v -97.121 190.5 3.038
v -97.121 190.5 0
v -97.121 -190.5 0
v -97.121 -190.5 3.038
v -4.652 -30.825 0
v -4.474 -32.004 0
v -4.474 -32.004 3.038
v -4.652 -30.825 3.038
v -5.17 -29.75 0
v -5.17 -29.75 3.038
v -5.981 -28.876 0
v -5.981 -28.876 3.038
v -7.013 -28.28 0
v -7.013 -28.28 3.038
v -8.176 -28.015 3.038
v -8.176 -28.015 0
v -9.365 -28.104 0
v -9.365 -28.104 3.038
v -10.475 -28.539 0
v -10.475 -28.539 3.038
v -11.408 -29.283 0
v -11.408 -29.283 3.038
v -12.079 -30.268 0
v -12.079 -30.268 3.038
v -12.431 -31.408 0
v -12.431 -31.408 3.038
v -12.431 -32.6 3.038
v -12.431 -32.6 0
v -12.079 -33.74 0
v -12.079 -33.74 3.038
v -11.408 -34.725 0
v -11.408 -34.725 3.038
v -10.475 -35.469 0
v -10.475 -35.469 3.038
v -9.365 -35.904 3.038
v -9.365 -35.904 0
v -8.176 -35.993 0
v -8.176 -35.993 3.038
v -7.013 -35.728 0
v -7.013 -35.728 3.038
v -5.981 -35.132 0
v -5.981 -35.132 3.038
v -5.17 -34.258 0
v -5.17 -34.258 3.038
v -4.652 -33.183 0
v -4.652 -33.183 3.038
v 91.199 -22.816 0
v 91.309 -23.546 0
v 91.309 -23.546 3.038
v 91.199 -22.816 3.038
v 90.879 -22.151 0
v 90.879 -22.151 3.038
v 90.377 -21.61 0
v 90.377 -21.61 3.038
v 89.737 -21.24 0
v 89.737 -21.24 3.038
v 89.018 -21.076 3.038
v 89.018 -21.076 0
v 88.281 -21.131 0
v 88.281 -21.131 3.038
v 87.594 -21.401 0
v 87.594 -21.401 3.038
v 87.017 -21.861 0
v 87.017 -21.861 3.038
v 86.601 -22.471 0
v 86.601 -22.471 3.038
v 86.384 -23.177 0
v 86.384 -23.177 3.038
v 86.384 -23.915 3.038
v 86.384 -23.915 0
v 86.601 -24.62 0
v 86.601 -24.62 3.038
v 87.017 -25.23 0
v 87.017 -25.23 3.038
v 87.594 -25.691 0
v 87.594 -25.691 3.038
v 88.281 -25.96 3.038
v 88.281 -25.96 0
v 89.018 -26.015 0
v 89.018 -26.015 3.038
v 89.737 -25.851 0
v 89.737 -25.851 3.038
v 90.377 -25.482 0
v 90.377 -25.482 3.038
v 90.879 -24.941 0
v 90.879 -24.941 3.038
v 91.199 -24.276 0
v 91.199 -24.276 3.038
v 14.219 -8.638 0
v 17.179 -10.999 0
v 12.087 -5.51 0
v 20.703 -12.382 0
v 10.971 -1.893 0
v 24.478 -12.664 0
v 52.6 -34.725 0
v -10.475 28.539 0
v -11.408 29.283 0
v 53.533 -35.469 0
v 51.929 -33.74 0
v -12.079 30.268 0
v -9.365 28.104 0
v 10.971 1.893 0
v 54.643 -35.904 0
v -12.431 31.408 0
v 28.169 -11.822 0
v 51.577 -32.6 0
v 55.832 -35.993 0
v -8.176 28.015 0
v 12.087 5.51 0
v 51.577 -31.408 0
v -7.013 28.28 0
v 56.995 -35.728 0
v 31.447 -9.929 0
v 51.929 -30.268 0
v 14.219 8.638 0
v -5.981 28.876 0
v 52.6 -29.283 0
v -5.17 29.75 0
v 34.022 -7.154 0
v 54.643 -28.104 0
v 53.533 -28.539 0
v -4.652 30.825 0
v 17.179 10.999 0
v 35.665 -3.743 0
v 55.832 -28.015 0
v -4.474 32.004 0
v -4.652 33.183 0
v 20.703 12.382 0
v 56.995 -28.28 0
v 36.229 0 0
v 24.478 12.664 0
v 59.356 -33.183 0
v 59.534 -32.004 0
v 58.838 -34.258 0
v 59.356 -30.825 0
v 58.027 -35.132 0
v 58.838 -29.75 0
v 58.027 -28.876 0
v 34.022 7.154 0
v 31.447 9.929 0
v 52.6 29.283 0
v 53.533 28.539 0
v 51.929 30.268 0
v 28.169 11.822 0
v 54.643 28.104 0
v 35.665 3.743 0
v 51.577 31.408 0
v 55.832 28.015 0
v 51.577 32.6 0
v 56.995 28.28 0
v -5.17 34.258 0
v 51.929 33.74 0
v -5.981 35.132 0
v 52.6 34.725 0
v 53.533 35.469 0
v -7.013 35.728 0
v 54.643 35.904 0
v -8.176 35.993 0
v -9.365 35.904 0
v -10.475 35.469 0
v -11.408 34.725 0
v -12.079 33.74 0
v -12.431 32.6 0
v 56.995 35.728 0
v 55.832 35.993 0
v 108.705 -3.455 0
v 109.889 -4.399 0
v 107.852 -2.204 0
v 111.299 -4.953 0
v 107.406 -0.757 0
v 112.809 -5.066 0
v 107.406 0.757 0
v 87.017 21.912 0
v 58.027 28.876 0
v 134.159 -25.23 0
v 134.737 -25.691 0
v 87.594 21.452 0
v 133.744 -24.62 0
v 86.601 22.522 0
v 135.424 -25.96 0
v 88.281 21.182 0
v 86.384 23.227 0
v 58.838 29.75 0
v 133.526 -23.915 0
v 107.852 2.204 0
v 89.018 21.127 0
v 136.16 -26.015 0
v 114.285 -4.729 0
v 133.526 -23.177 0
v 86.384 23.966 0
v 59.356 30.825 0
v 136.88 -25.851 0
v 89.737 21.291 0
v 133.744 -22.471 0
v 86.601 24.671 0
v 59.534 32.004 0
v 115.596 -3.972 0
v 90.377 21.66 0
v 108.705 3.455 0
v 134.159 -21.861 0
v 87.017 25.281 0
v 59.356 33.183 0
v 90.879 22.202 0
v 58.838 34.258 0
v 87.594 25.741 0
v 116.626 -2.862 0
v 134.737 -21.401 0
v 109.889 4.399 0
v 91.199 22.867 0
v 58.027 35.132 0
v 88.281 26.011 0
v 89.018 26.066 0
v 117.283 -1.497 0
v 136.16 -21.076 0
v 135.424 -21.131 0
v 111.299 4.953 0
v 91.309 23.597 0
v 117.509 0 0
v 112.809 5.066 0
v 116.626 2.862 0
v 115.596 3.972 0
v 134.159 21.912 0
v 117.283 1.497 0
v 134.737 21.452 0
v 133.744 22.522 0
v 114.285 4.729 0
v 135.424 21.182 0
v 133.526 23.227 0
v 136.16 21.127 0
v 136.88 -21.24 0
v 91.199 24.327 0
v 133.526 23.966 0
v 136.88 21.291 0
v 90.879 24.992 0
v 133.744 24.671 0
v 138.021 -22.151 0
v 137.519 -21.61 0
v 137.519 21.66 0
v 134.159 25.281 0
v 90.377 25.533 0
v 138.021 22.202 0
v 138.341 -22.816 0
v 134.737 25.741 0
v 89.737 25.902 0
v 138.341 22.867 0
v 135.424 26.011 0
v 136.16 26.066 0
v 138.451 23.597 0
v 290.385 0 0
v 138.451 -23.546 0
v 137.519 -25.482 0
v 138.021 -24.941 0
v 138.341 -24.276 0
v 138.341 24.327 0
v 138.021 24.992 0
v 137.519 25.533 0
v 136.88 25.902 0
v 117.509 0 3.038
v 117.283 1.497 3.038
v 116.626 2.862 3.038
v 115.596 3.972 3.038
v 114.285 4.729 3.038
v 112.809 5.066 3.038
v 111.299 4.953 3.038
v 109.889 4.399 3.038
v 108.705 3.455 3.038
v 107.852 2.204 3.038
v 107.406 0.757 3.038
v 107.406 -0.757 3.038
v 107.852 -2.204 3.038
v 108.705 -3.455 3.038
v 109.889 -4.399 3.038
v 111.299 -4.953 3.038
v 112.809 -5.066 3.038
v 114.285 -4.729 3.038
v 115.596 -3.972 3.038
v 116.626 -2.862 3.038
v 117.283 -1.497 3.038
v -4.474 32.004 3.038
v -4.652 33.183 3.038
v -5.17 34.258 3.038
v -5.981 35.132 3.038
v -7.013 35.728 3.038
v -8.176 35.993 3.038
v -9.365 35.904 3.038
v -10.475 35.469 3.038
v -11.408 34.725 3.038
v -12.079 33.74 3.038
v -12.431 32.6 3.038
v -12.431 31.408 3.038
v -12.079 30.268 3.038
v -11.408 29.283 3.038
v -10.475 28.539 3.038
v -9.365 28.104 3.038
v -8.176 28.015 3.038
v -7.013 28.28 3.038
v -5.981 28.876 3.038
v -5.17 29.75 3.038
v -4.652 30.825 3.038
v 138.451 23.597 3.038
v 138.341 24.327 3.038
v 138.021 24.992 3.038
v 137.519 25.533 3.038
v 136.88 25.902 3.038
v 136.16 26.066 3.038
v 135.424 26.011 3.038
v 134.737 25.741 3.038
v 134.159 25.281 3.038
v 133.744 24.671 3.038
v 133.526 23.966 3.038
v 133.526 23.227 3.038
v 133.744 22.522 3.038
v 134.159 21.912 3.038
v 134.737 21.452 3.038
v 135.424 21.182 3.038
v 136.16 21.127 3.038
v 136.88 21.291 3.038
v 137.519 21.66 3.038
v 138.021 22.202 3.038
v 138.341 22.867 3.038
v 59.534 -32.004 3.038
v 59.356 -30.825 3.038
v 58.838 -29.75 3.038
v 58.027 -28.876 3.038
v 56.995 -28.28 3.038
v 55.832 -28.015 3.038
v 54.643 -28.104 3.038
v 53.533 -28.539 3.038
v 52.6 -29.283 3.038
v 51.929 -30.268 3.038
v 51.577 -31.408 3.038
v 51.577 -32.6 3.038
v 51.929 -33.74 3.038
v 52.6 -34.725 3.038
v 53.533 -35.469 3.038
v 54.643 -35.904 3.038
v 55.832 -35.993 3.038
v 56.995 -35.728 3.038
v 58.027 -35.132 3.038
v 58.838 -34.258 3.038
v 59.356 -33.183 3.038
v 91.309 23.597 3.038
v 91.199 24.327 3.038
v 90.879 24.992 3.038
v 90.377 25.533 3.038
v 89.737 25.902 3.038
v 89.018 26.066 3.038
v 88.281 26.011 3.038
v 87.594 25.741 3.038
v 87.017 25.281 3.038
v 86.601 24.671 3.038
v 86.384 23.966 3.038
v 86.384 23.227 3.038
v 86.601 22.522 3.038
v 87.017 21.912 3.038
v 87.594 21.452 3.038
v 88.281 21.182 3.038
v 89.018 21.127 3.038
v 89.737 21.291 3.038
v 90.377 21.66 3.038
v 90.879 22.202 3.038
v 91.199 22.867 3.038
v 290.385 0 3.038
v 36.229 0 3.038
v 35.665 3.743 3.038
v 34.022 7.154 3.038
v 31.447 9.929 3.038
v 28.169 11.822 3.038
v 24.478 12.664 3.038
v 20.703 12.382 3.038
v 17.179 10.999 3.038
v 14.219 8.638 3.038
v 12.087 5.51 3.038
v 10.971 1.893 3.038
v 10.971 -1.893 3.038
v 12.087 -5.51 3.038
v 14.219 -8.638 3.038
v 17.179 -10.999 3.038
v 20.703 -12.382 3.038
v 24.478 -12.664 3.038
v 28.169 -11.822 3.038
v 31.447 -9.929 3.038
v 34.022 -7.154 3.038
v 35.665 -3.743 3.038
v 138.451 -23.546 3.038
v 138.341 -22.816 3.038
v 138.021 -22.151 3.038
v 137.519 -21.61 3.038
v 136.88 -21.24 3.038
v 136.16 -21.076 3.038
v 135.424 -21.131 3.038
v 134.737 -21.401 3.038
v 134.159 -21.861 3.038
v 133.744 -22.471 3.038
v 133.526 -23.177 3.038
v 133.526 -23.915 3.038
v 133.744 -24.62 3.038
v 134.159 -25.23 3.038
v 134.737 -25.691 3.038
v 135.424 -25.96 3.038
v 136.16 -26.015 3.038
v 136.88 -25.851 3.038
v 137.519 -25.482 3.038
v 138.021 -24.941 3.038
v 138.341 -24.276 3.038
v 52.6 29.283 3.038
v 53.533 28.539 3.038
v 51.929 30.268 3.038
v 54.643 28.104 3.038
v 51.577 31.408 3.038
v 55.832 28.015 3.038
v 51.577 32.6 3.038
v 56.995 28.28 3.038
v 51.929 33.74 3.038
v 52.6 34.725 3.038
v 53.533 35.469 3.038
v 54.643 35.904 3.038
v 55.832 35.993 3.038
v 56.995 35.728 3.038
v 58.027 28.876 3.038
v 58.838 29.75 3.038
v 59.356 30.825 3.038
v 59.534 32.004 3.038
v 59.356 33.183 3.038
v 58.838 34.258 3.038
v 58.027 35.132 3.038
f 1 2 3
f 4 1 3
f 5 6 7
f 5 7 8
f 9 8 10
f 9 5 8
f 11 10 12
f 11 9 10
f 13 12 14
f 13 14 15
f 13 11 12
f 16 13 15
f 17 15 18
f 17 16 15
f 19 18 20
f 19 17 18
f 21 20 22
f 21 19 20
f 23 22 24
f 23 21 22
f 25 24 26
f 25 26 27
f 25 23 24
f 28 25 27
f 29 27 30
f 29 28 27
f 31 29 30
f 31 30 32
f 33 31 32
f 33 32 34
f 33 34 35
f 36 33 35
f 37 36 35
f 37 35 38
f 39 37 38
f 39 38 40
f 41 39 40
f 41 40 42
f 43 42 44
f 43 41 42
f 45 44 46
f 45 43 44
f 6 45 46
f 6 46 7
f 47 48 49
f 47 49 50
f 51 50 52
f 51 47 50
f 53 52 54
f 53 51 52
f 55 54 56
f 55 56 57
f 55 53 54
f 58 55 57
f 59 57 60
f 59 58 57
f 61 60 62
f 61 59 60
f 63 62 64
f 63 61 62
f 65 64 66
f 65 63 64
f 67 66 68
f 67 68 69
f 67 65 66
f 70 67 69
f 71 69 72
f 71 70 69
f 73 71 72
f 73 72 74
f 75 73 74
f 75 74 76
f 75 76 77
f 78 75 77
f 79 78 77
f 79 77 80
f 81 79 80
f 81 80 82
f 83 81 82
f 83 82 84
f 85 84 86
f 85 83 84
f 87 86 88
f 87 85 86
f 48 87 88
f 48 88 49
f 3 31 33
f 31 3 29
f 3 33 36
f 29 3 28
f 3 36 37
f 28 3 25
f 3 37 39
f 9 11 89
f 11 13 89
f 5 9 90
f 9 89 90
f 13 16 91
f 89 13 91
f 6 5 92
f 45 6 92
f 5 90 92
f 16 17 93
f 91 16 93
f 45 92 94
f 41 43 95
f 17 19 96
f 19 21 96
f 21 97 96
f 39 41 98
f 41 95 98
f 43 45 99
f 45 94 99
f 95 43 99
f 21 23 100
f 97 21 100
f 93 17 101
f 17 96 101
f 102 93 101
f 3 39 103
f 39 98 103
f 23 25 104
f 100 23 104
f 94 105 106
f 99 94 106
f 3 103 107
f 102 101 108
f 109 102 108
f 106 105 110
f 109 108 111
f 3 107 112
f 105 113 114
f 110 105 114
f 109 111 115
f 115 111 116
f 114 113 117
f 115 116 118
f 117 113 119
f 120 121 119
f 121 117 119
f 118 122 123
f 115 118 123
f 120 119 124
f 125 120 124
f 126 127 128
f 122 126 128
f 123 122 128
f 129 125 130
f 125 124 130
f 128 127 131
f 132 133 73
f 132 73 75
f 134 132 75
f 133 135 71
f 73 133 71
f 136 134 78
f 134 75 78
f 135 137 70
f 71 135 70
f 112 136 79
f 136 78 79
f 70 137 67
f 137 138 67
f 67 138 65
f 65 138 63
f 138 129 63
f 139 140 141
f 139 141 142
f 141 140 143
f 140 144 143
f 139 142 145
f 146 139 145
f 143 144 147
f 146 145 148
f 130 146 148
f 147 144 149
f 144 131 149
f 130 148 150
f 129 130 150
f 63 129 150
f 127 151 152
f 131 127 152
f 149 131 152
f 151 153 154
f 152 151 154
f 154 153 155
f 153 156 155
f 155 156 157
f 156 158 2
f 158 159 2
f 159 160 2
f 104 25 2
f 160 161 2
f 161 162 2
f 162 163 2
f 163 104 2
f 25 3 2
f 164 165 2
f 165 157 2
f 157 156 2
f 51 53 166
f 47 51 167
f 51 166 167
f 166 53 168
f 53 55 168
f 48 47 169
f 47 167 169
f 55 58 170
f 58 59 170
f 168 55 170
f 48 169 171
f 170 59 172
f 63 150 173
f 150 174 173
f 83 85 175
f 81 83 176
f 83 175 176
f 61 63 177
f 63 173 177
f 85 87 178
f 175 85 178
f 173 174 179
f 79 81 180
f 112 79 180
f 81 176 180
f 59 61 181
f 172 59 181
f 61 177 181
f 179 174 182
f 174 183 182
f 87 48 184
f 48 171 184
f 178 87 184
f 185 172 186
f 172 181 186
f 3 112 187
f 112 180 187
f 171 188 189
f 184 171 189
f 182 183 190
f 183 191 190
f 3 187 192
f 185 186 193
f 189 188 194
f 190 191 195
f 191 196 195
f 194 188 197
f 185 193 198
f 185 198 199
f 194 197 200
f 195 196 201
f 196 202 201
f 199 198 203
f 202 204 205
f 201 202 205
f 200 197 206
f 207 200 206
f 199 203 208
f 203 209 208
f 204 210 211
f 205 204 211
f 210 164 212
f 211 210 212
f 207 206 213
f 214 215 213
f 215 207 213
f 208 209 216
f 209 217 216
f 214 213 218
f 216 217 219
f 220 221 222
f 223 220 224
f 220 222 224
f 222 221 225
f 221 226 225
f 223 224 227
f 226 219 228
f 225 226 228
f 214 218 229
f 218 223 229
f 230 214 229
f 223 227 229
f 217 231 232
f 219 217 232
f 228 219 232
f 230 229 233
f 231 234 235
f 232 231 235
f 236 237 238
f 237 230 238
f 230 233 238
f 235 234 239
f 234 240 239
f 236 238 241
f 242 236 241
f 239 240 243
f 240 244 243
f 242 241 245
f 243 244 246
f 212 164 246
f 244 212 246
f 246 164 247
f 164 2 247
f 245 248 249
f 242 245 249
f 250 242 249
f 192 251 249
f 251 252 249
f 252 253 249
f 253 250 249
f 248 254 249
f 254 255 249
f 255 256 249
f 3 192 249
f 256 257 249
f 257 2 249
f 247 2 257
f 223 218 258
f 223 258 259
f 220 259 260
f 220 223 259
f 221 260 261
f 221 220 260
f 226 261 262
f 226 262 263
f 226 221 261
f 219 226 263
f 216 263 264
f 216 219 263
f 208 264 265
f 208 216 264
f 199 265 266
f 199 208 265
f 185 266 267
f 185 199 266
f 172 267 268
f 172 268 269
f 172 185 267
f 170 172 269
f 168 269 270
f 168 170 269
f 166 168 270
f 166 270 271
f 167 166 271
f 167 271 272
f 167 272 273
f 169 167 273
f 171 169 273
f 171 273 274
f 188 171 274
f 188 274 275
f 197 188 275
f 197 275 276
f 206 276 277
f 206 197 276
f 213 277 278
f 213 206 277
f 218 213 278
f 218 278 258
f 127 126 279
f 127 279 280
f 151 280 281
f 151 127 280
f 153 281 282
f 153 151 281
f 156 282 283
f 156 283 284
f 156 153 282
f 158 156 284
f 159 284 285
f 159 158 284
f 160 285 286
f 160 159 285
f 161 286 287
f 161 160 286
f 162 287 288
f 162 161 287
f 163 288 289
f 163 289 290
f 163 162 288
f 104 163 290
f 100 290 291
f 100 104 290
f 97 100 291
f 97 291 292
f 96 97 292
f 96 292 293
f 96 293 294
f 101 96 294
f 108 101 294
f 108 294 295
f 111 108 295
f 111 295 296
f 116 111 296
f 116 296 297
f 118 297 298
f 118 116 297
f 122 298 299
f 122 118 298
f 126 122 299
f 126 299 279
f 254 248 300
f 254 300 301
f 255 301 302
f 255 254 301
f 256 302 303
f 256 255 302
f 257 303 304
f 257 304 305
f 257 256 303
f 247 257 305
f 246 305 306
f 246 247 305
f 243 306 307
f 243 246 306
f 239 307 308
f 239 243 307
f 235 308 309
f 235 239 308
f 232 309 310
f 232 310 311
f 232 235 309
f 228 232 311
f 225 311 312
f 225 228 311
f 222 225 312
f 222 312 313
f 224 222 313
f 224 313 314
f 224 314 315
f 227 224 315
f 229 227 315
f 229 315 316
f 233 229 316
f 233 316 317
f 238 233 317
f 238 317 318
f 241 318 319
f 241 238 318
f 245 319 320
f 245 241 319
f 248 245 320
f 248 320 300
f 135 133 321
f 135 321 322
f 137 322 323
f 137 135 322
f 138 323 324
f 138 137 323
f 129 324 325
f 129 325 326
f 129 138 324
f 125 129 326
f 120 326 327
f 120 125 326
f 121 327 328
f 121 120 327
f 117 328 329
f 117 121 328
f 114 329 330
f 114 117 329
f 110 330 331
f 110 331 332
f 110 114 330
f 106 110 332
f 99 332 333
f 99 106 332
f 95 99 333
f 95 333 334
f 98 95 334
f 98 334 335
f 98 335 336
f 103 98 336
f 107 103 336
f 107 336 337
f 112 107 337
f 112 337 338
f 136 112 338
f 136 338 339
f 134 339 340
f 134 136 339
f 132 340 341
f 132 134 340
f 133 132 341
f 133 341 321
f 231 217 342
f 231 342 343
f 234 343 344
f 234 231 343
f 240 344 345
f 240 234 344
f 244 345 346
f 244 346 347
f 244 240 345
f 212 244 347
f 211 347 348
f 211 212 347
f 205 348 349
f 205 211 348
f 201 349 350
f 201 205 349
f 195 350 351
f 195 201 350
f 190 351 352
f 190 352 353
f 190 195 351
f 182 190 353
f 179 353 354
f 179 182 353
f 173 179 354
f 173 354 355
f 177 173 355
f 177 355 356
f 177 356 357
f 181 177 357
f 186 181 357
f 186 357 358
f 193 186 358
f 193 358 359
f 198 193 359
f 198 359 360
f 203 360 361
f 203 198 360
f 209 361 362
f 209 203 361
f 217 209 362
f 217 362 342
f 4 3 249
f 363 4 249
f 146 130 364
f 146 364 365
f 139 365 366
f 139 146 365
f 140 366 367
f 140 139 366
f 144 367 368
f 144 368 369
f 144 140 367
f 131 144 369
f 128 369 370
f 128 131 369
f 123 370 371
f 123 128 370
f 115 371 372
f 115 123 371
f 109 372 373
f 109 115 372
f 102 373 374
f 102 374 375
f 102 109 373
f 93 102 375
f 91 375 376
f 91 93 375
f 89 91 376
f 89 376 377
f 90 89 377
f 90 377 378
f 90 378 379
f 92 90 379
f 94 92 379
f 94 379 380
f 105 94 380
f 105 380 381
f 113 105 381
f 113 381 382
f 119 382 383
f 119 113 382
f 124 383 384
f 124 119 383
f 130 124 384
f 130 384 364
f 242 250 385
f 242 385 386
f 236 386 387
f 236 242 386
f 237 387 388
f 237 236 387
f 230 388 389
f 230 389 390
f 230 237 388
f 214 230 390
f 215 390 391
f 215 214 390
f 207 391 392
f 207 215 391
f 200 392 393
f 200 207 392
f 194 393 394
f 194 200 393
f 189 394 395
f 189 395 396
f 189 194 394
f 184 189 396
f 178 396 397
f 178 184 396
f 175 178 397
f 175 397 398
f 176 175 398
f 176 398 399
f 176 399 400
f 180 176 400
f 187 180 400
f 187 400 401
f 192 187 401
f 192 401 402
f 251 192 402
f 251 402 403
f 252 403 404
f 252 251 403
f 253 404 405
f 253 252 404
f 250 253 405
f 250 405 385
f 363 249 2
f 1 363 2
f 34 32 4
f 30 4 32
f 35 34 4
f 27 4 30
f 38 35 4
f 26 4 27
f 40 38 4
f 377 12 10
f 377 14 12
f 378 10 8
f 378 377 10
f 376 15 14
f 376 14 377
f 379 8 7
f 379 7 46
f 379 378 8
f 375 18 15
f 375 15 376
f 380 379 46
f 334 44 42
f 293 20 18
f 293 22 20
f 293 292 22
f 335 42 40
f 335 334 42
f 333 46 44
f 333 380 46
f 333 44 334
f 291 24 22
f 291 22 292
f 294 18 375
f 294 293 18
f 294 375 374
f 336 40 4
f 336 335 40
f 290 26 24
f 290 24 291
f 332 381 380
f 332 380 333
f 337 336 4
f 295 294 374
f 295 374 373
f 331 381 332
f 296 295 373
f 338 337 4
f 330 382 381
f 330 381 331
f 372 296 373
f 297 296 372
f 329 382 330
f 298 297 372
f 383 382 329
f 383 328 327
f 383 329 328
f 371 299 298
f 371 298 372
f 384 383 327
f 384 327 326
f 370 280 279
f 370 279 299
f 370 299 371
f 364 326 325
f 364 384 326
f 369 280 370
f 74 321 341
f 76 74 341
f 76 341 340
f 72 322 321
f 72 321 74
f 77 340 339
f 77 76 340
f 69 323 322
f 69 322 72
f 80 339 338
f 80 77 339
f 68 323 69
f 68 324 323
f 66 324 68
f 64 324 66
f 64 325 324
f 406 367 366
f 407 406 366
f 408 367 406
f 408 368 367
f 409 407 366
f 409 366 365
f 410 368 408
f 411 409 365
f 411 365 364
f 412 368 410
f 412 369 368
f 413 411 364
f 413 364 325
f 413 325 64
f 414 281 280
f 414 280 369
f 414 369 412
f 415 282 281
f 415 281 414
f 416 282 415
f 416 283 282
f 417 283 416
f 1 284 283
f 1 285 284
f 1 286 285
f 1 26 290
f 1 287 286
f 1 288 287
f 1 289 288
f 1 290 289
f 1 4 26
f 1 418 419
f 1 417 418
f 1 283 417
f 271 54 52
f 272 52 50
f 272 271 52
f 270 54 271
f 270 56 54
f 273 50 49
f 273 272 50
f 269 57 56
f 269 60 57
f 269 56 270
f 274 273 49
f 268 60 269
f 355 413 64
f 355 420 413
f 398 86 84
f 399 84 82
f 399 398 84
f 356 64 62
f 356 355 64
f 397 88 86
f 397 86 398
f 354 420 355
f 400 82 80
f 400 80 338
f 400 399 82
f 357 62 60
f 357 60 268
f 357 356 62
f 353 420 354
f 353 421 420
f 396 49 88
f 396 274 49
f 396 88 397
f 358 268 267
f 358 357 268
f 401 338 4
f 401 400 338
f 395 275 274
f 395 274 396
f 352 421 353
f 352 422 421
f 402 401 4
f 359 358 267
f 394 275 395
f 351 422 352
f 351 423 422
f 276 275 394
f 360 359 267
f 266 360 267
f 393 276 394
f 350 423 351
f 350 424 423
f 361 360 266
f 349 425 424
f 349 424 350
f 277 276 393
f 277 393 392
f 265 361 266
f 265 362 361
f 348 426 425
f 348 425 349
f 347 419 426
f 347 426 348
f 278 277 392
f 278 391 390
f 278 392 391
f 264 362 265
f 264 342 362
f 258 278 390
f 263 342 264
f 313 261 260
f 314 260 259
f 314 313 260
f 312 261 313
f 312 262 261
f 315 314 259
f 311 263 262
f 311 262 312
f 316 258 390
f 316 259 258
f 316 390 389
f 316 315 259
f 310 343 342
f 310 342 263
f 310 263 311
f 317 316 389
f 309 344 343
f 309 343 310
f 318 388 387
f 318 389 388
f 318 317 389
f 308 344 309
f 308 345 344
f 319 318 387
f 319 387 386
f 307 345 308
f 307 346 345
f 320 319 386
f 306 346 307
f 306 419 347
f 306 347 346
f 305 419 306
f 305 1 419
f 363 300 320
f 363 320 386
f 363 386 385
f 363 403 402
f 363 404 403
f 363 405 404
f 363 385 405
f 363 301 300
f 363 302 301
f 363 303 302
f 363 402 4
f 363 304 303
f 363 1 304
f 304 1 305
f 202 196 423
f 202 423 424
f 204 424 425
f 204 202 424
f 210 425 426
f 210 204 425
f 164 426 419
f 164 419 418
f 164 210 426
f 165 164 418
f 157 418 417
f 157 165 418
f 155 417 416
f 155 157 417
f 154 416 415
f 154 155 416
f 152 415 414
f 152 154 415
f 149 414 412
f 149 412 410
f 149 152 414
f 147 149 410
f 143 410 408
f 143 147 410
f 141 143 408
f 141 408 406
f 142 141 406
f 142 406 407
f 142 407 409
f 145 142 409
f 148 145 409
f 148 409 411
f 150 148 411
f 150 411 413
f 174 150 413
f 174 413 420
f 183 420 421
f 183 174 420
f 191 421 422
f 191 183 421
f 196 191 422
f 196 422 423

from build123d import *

# Parameters (mm, degrees)
F0_R     = 4.0005
F0_R_2   = 2.4765
F0_R_3   = 12.7
F0_R_4   = 5.08
F1_DEPTH = 3.03784


with BuildPart() as f1:
    # F0 (on Top) → F1 (new body)
    with BuildSketch(Plane.XY):
        Polygon((-97.120928, -190.5), (290.385188, 0), (-97.120928, 190.5), align=None)
        with Locations((-8.474928, -32.004)):
            Circle(F0_R, mode=Mode.SUBTRACT)
        with Locations((55.533072, -32.004)):
            Circle(F0_R, mode=Mode.SUBTRACT)
        with Locations((88.832472, -23.5458)):
            Circle(F0_R_2, mode=Mode.SUBTRACT)
        with Locations((135.974872, -23.5458)):
            Circle(F0_R_2, mode=Mode.SUBTRACT)
        with Locations((-8.474928, 32.004)):
            Circle(F0_R, mode=Mode.SUBTRACT)
        with Locations((23.529072, 0)):
            Circle(F0_R_3, mode=Mode.SUBTRACT)
        with Locations((88.832472, 23.5966)):
            Circle(F0_R_2, mode=Mode.SUBTRACT)
        with Locations((55.533072, 32.004)):
            Circle(F0_R, mode=Mode.SUBTRACT)
        with Locations((112.429072, 0)):
            Circle(F0_R_4, mode=Mode.SUBTRACT)
        with Locations((135.974872, 23.5966)):
            Circle(F0_R_2, mode=Mode.SUBTRACT)
    extrude(amount=F1_DEPTH)


solid = f1.part
